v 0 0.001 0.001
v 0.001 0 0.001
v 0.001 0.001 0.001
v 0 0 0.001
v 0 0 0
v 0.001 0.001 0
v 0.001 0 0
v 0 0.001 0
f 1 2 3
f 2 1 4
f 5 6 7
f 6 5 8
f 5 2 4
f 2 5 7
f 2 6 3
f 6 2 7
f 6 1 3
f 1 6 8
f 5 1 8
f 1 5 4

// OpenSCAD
// file: ../modules/insert.scad
// modules/insert.scad
function _lerp(a, b, t) = a + (b - a) * t;

function insert_cavity_height(insert_height, floor_thickness, bottom_margin) =
    insert_height + floor_thickness + bottom_margin;

function cavity_radius_at(z, insert_top_d, insert_bottom_d, insert_height,
                           ledge_engagement_height, fit_clearance, body_clearance,
                           pot_height) =
    let(
        insert_bottom_z = pot_height - insert_height,
        ledge_bottom_z  = pot_height - ledge_engagement_height
    )
    z <= insert_bottom_z ? insert_bottom_d/2 + body_clearance :
    z <  ledge_bottom_z  ? _lerp(insert_bottom_d/2, insert_top_d/2,
                                  (z - insert_bottom_z) / (ledge_bottom_z - insert_bottom_z))
                            + body_clearance :
    insert_top_d/2 + fit_clearance;

module insert_cavity(insert_top_d, insert_bottom_d, insert_height,
                      ledge_engagement_height, fit_clearance, body_clearance,
                      bottom_margin, floor_thickness, overshoot=20, fn=50) {
    pot_height = insert_cavity_height(insert_height, floor_thickness, bottom_margin);
    ledge_bottom_z = pot_height - ledge_engagement_height;
    r_bottom      = cavity_radius_at(floor_thickness, insert_top_d, insert_bottom_d,
                                      insert_height, ledge_engagement_height,
                                      fit_clearance, body_clearance, pot_height);
    r_ledge_lower = cavity_radius_at(ledge_bottom_z, insert_top_d, insert_bottom_d,
                                      insert_height, ledge_engagement_height,
                                      fit_clearance, body_clearance, pot_height);
    r_ledge_upper = insert_top_d/2 + fit_clearance;

    pts = [
        [0, floor_thickness],
        [r_bottom, floor_thickness],
        [r_bottom, pot_height - insert_height],
        [r_ledge_lower, ledge_bottom_z],
        [r_ledge_upper, ledge_bottom_z],
        [r_ledge_upper, pot_height + overshoot],
        [0, pot_height + overshoot]
    ];
    rotate_extrude($fn=fn) polygon(pts);
}
// main file
// tests/test_insert.scad
include <../modules/insert.scad>

// pot_height = insert_height + floor_thickness + bottom_margin
h = insert_cavity_height(130, 3, 5);
assert(h == 138, str("expected pot_height 138, got ", h));

// At the very top (z = pot_height), radius must equal the tight ledge fit.
r_top = cavity_radius_at(138, 150, 110, 130, 8, 0.3, 3, 138);
assert(r_top == 150/2 + 0.3, str("expected ledge radius 75.3, got ", r_top));

// At the bottom of the cavity (z = floor_thickness), radius must equal the
// loose clearance-zone fit around the insert's bottom.
r_bottom = cavity_radius_at(3, 150, 110, 130, 8, 0.3, 3, 138);
assert(r_bottom == 110/2 + 3, str("expected clearance radius 58, got ", r_bottom));

cube(0.001);
